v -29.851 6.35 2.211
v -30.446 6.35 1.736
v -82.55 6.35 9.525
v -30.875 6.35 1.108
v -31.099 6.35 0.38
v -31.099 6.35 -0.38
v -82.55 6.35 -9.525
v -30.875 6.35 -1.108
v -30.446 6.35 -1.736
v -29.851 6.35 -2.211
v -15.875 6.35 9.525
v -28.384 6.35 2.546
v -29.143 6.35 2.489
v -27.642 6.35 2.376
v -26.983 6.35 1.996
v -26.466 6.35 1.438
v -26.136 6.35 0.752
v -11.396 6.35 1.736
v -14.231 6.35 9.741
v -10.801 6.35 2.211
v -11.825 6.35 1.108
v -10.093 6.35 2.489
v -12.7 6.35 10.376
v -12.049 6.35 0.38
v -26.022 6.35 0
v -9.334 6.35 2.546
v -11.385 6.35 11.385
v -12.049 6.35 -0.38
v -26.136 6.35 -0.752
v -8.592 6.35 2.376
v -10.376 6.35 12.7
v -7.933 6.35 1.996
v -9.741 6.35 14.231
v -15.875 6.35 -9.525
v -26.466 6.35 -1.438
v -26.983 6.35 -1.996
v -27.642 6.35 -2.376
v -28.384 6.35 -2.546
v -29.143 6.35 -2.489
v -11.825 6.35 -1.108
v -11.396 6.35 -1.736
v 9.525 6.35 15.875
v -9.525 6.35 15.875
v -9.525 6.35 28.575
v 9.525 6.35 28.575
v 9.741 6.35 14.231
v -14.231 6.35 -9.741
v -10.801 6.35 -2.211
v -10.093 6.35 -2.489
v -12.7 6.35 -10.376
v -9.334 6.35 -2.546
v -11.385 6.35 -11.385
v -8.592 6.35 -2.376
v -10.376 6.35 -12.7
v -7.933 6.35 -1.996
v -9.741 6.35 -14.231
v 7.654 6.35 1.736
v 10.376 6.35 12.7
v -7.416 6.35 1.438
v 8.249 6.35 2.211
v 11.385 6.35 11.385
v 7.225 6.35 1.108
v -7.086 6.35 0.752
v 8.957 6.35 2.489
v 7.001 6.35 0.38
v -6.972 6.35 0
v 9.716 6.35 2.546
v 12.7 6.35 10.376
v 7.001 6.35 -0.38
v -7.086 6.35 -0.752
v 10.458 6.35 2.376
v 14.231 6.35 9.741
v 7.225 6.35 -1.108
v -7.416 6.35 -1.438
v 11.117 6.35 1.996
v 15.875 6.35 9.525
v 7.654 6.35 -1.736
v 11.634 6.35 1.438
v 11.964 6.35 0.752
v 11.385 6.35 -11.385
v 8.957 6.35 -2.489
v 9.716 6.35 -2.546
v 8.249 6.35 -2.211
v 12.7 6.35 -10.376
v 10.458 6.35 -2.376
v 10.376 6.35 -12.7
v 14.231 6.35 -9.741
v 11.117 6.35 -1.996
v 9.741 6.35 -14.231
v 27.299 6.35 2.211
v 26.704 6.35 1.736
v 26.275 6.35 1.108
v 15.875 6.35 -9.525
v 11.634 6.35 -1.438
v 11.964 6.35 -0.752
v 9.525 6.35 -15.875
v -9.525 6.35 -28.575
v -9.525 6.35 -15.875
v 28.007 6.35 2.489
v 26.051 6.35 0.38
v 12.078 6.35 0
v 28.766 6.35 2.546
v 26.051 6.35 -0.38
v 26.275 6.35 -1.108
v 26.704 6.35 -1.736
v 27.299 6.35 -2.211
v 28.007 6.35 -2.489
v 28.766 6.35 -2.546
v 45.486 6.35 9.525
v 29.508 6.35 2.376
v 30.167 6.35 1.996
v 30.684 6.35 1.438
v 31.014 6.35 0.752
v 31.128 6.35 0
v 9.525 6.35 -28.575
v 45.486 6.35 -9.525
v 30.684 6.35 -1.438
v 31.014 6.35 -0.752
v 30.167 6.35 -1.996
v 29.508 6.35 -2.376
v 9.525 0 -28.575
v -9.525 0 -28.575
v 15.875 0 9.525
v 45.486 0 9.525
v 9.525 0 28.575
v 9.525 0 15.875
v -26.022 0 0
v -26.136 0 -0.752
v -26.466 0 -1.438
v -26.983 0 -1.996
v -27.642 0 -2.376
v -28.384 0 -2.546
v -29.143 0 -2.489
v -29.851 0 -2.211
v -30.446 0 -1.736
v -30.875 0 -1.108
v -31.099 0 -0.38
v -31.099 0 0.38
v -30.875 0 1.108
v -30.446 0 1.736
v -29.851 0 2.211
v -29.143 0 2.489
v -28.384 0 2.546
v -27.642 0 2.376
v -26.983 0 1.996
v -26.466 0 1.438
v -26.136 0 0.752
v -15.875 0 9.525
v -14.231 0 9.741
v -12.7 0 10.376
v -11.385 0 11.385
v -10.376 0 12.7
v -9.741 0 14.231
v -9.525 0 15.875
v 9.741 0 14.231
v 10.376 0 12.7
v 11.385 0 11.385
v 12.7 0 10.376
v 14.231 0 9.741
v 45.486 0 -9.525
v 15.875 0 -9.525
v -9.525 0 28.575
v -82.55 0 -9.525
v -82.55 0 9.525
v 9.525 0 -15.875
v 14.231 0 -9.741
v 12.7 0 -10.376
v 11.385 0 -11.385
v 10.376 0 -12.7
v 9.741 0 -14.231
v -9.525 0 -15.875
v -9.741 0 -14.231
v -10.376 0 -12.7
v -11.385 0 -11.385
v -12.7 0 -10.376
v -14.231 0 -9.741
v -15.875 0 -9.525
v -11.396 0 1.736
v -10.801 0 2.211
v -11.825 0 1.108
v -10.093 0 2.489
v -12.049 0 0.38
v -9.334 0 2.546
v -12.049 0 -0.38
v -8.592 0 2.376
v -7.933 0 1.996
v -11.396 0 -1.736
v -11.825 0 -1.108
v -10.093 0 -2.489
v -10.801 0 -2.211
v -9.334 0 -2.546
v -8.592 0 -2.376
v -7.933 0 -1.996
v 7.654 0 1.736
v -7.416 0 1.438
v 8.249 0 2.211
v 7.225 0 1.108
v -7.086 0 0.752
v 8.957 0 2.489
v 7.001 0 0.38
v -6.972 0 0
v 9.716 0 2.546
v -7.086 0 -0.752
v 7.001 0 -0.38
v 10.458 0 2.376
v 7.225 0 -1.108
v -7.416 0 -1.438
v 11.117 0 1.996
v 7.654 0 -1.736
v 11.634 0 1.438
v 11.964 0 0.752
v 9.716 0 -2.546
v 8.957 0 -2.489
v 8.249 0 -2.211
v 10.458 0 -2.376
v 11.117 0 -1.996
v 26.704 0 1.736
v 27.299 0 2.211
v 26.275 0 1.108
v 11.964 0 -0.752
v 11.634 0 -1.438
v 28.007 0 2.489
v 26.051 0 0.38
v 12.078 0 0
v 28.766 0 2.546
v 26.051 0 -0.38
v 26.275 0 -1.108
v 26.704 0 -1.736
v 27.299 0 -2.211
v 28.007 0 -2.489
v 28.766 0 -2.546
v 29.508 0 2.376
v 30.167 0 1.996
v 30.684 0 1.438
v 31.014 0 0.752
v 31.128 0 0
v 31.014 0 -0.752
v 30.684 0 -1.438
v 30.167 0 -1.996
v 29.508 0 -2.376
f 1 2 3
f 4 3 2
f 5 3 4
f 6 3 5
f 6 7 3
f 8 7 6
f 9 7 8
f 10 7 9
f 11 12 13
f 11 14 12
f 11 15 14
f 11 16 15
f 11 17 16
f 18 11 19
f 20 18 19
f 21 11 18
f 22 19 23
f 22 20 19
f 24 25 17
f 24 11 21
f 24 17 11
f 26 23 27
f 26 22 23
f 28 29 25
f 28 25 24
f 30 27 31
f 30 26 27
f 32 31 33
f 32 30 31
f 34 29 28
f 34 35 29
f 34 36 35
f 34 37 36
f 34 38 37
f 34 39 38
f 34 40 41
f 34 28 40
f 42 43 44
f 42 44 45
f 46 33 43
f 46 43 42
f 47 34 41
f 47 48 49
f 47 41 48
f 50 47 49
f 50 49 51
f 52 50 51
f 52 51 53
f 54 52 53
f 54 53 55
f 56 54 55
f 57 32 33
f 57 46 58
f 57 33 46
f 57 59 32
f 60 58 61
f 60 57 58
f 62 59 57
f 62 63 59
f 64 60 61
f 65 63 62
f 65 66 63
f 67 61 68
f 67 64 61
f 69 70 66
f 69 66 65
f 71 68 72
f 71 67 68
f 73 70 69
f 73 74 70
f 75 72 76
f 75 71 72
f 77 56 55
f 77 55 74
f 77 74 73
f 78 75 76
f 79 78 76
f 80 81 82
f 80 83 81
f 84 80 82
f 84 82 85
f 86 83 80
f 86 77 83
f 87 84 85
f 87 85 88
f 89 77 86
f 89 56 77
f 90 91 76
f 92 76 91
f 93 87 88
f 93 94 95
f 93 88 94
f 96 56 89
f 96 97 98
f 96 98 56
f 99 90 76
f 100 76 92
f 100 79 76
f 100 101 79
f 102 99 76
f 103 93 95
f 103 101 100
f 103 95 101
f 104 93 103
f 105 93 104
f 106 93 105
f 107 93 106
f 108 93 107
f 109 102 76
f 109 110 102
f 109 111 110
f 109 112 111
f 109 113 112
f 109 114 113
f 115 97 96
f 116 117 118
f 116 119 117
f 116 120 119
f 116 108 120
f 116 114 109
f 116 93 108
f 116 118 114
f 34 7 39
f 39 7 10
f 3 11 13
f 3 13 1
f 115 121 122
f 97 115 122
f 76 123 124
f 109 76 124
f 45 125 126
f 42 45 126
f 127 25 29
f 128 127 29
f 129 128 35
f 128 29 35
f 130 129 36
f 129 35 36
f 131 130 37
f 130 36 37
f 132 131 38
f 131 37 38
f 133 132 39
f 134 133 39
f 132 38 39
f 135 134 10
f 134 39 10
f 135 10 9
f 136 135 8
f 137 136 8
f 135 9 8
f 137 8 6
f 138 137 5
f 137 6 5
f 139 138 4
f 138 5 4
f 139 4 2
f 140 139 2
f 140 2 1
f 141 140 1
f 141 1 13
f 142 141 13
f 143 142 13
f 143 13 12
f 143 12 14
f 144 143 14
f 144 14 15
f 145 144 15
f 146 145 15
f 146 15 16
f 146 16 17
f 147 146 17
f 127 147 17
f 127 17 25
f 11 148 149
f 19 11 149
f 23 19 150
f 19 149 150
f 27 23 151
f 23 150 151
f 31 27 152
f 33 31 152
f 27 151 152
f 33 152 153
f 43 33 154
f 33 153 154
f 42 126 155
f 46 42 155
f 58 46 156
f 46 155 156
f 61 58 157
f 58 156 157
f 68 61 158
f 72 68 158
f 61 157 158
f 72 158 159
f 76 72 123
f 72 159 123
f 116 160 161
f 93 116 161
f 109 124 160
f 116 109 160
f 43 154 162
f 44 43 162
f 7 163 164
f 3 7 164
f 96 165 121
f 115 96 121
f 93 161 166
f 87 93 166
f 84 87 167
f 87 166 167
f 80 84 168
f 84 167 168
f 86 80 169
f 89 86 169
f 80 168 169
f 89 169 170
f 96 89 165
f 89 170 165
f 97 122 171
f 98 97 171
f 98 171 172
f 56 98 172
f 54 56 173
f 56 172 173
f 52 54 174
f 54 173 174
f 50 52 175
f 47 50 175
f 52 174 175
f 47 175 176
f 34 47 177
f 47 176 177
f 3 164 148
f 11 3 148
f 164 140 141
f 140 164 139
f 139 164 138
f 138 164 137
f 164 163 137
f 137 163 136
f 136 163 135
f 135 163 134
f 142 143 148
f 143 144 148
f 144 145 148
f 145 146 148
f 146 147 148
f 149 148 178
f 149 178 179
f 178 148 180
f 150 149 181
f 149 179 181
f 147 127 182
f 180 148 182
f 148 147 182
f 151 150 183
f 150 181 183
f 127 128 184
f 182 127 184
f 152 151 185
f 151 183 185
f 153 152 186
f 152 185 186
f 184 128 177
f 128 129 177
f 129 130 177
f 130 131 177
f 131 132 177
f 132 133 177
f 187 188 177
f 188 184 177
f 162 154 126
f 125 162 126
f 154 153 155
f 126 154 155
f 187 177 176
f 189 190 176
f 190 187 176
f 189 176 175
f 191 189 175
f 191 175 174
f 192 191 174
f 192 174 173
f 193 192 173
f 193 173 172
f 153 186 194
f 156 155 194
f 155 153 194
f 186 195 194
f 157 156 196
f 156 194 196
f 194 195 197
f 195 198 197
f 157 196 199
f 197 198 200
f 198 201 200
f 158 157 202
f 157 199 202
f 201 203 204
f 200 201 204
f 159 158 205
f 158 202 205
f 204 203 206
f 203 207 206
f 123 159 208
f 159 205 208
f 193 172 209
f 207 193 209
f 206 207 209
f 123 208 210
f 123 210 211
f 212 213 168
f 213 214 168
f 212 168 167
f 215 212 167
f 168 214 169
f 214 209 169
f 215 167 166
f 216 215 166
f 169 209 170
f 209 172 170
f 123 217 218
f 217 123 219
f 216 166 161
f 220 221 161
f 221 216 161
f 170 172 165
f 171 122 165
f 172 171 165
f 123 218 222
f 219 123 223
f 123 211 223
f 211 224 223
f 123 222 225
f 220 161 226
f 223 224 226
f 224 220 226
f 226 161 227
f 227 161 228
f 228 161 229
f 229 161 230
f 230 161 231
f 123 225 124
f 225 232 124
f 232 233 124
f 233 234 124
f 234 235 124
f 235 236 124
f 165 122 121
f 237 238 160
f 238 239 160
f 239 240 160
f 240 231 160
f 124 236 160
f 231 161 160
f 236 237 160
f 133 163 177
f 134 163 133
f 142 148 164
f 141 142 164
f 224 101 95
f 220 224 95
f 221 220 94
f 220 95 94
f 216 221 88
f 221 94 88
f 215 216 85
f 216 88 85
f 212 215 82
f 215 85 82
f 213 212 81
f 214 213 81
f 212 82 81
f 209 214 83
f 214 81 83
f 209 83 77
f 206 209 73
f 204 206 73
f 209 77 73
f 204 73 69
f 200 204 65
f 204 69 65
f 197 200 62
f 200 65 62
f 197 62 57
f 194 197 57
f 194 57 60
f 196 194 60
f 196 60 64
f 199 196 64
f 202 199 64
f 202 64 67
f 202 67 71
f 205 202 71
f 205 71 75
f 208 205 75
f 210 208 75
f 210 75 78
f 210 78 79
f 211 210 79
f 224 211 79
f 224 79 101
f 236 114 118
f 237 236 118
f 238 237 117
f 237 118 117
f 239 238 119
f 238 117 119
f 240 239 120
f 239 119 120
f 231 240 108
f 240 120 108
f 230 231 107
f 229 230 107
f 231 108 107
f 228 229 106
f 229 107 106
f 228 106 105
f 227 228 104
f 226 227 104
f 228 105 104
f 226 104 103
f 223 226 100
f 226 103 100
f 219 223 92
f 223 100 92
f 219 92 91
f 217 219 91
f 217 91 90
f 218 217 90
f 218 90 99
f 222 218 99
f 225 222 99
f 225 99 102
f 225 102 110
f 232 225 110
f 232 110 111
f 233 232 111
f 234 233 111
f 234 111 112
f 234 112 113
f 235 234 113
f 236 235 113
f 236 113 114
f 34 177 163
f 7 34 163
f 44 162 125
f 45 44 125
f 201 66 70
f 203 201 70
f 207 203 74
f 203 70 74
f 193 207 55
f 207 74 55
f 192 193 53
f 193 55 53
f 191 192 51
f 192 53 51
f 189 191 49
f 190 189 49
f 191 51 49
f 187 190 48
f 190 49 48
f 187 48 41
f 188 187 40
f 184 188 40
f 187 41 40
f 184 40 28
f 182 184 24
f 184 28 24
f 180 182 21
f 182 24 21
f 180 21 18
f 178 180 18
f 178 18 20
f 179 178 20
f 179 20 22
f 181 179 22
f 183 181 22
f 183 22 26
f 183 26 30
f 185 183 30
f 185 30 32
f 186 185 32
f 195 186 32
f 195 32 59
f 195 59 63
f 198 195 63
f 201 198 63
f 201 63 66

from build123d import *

# Parameters (mm, degrees)
BOSS_EXTRUDE1_DEPTH     = 6.35
F_1_4_20_TAPPED_HOLE1_D = 5.1054
LPATTERN1_COUNT         = 4
LPATTERN1_PITCH         = 19.05


with BuildPart() as part:
    # Sketch1 → Boss-Extrude1 (new body)
    with BuildSketch(Plane(origin=(0, 0, 0), x_dir=(1, 0, 0), z_dir=(0, 1, 0))):
        with BuildLine():
            Line((-74.82695853, -9.525), (-15.875, -9.525))
            ThreePointArc((-15.875, -9.525), (-11.384871939, -11.384871939), (-9.525, -15.875))
            Line((-9.525, -15.875), (-9.525, -28.575))
            Line((-9.525, -28.575), (9.525, -28.575))
            Line((9.525, -28.575), (9.525, -15.875))
            ThreePointArc((9.525, -15.875), (11.384871939, -11.384871939), (15.875, -9.525))
            Line((15.875, -9.525), (45.485511374, -9.525))
            Line((45.485511374, -9.525), (45.485511374, 9.525))
            Line((45.485511374, 9.525), (15.875, 9.525))
            ThreePointArc((15.875, 9.525), (11.384871939, 11.384871939), (9.525, 15.875))
            Line((9.525, 15.875), (9.525, 28.575))
            Line((9.525, 28.575), (-9.525, 28.575))
            Line((-9.525, 28.575), (-9.525, 15.875))
            ThreePointArc((-9.525, 15.875), (-11.384871939, 11.384871939), (-15.875, 9.525))
            Line((-15.875, 9.525), (-75.059577466, 9.525))
            Line((-75.059577466, 9.525), (-82.55, 9.525))
            Line((-82.55, 9.525), (-82.55, -9.525))
            Line((-82.55, -9.525), (-74.82695853, -9.525))
        make_face()
    extrude(amount=BOSS_EXTRUDE1_DEPTH)

    # 1/4-20 Tapped Hole1 (through all)
    with Locations(Plane(origin=(0, 0, 0), x_dir=(-1, 0, 0), z_dir=(0, -1, 0))):
        with Locations((28.575, 0)):
            f_1_4_20_tapped_hole1 = Hole(F_1_4_20_TAPPED_HOLE1_D / 2)

    # LPattern1: 1/4-20 Tapped Hole1 ×4
    with Locations(*[(i * LPATTERN1_PITCH, 0, 0) for i in range(1, LPATTERN1_COUNT)]):
        add(f_1_4_20_tapped_hole1, mode=Mode.SUBTRACT)


solid = part.part
